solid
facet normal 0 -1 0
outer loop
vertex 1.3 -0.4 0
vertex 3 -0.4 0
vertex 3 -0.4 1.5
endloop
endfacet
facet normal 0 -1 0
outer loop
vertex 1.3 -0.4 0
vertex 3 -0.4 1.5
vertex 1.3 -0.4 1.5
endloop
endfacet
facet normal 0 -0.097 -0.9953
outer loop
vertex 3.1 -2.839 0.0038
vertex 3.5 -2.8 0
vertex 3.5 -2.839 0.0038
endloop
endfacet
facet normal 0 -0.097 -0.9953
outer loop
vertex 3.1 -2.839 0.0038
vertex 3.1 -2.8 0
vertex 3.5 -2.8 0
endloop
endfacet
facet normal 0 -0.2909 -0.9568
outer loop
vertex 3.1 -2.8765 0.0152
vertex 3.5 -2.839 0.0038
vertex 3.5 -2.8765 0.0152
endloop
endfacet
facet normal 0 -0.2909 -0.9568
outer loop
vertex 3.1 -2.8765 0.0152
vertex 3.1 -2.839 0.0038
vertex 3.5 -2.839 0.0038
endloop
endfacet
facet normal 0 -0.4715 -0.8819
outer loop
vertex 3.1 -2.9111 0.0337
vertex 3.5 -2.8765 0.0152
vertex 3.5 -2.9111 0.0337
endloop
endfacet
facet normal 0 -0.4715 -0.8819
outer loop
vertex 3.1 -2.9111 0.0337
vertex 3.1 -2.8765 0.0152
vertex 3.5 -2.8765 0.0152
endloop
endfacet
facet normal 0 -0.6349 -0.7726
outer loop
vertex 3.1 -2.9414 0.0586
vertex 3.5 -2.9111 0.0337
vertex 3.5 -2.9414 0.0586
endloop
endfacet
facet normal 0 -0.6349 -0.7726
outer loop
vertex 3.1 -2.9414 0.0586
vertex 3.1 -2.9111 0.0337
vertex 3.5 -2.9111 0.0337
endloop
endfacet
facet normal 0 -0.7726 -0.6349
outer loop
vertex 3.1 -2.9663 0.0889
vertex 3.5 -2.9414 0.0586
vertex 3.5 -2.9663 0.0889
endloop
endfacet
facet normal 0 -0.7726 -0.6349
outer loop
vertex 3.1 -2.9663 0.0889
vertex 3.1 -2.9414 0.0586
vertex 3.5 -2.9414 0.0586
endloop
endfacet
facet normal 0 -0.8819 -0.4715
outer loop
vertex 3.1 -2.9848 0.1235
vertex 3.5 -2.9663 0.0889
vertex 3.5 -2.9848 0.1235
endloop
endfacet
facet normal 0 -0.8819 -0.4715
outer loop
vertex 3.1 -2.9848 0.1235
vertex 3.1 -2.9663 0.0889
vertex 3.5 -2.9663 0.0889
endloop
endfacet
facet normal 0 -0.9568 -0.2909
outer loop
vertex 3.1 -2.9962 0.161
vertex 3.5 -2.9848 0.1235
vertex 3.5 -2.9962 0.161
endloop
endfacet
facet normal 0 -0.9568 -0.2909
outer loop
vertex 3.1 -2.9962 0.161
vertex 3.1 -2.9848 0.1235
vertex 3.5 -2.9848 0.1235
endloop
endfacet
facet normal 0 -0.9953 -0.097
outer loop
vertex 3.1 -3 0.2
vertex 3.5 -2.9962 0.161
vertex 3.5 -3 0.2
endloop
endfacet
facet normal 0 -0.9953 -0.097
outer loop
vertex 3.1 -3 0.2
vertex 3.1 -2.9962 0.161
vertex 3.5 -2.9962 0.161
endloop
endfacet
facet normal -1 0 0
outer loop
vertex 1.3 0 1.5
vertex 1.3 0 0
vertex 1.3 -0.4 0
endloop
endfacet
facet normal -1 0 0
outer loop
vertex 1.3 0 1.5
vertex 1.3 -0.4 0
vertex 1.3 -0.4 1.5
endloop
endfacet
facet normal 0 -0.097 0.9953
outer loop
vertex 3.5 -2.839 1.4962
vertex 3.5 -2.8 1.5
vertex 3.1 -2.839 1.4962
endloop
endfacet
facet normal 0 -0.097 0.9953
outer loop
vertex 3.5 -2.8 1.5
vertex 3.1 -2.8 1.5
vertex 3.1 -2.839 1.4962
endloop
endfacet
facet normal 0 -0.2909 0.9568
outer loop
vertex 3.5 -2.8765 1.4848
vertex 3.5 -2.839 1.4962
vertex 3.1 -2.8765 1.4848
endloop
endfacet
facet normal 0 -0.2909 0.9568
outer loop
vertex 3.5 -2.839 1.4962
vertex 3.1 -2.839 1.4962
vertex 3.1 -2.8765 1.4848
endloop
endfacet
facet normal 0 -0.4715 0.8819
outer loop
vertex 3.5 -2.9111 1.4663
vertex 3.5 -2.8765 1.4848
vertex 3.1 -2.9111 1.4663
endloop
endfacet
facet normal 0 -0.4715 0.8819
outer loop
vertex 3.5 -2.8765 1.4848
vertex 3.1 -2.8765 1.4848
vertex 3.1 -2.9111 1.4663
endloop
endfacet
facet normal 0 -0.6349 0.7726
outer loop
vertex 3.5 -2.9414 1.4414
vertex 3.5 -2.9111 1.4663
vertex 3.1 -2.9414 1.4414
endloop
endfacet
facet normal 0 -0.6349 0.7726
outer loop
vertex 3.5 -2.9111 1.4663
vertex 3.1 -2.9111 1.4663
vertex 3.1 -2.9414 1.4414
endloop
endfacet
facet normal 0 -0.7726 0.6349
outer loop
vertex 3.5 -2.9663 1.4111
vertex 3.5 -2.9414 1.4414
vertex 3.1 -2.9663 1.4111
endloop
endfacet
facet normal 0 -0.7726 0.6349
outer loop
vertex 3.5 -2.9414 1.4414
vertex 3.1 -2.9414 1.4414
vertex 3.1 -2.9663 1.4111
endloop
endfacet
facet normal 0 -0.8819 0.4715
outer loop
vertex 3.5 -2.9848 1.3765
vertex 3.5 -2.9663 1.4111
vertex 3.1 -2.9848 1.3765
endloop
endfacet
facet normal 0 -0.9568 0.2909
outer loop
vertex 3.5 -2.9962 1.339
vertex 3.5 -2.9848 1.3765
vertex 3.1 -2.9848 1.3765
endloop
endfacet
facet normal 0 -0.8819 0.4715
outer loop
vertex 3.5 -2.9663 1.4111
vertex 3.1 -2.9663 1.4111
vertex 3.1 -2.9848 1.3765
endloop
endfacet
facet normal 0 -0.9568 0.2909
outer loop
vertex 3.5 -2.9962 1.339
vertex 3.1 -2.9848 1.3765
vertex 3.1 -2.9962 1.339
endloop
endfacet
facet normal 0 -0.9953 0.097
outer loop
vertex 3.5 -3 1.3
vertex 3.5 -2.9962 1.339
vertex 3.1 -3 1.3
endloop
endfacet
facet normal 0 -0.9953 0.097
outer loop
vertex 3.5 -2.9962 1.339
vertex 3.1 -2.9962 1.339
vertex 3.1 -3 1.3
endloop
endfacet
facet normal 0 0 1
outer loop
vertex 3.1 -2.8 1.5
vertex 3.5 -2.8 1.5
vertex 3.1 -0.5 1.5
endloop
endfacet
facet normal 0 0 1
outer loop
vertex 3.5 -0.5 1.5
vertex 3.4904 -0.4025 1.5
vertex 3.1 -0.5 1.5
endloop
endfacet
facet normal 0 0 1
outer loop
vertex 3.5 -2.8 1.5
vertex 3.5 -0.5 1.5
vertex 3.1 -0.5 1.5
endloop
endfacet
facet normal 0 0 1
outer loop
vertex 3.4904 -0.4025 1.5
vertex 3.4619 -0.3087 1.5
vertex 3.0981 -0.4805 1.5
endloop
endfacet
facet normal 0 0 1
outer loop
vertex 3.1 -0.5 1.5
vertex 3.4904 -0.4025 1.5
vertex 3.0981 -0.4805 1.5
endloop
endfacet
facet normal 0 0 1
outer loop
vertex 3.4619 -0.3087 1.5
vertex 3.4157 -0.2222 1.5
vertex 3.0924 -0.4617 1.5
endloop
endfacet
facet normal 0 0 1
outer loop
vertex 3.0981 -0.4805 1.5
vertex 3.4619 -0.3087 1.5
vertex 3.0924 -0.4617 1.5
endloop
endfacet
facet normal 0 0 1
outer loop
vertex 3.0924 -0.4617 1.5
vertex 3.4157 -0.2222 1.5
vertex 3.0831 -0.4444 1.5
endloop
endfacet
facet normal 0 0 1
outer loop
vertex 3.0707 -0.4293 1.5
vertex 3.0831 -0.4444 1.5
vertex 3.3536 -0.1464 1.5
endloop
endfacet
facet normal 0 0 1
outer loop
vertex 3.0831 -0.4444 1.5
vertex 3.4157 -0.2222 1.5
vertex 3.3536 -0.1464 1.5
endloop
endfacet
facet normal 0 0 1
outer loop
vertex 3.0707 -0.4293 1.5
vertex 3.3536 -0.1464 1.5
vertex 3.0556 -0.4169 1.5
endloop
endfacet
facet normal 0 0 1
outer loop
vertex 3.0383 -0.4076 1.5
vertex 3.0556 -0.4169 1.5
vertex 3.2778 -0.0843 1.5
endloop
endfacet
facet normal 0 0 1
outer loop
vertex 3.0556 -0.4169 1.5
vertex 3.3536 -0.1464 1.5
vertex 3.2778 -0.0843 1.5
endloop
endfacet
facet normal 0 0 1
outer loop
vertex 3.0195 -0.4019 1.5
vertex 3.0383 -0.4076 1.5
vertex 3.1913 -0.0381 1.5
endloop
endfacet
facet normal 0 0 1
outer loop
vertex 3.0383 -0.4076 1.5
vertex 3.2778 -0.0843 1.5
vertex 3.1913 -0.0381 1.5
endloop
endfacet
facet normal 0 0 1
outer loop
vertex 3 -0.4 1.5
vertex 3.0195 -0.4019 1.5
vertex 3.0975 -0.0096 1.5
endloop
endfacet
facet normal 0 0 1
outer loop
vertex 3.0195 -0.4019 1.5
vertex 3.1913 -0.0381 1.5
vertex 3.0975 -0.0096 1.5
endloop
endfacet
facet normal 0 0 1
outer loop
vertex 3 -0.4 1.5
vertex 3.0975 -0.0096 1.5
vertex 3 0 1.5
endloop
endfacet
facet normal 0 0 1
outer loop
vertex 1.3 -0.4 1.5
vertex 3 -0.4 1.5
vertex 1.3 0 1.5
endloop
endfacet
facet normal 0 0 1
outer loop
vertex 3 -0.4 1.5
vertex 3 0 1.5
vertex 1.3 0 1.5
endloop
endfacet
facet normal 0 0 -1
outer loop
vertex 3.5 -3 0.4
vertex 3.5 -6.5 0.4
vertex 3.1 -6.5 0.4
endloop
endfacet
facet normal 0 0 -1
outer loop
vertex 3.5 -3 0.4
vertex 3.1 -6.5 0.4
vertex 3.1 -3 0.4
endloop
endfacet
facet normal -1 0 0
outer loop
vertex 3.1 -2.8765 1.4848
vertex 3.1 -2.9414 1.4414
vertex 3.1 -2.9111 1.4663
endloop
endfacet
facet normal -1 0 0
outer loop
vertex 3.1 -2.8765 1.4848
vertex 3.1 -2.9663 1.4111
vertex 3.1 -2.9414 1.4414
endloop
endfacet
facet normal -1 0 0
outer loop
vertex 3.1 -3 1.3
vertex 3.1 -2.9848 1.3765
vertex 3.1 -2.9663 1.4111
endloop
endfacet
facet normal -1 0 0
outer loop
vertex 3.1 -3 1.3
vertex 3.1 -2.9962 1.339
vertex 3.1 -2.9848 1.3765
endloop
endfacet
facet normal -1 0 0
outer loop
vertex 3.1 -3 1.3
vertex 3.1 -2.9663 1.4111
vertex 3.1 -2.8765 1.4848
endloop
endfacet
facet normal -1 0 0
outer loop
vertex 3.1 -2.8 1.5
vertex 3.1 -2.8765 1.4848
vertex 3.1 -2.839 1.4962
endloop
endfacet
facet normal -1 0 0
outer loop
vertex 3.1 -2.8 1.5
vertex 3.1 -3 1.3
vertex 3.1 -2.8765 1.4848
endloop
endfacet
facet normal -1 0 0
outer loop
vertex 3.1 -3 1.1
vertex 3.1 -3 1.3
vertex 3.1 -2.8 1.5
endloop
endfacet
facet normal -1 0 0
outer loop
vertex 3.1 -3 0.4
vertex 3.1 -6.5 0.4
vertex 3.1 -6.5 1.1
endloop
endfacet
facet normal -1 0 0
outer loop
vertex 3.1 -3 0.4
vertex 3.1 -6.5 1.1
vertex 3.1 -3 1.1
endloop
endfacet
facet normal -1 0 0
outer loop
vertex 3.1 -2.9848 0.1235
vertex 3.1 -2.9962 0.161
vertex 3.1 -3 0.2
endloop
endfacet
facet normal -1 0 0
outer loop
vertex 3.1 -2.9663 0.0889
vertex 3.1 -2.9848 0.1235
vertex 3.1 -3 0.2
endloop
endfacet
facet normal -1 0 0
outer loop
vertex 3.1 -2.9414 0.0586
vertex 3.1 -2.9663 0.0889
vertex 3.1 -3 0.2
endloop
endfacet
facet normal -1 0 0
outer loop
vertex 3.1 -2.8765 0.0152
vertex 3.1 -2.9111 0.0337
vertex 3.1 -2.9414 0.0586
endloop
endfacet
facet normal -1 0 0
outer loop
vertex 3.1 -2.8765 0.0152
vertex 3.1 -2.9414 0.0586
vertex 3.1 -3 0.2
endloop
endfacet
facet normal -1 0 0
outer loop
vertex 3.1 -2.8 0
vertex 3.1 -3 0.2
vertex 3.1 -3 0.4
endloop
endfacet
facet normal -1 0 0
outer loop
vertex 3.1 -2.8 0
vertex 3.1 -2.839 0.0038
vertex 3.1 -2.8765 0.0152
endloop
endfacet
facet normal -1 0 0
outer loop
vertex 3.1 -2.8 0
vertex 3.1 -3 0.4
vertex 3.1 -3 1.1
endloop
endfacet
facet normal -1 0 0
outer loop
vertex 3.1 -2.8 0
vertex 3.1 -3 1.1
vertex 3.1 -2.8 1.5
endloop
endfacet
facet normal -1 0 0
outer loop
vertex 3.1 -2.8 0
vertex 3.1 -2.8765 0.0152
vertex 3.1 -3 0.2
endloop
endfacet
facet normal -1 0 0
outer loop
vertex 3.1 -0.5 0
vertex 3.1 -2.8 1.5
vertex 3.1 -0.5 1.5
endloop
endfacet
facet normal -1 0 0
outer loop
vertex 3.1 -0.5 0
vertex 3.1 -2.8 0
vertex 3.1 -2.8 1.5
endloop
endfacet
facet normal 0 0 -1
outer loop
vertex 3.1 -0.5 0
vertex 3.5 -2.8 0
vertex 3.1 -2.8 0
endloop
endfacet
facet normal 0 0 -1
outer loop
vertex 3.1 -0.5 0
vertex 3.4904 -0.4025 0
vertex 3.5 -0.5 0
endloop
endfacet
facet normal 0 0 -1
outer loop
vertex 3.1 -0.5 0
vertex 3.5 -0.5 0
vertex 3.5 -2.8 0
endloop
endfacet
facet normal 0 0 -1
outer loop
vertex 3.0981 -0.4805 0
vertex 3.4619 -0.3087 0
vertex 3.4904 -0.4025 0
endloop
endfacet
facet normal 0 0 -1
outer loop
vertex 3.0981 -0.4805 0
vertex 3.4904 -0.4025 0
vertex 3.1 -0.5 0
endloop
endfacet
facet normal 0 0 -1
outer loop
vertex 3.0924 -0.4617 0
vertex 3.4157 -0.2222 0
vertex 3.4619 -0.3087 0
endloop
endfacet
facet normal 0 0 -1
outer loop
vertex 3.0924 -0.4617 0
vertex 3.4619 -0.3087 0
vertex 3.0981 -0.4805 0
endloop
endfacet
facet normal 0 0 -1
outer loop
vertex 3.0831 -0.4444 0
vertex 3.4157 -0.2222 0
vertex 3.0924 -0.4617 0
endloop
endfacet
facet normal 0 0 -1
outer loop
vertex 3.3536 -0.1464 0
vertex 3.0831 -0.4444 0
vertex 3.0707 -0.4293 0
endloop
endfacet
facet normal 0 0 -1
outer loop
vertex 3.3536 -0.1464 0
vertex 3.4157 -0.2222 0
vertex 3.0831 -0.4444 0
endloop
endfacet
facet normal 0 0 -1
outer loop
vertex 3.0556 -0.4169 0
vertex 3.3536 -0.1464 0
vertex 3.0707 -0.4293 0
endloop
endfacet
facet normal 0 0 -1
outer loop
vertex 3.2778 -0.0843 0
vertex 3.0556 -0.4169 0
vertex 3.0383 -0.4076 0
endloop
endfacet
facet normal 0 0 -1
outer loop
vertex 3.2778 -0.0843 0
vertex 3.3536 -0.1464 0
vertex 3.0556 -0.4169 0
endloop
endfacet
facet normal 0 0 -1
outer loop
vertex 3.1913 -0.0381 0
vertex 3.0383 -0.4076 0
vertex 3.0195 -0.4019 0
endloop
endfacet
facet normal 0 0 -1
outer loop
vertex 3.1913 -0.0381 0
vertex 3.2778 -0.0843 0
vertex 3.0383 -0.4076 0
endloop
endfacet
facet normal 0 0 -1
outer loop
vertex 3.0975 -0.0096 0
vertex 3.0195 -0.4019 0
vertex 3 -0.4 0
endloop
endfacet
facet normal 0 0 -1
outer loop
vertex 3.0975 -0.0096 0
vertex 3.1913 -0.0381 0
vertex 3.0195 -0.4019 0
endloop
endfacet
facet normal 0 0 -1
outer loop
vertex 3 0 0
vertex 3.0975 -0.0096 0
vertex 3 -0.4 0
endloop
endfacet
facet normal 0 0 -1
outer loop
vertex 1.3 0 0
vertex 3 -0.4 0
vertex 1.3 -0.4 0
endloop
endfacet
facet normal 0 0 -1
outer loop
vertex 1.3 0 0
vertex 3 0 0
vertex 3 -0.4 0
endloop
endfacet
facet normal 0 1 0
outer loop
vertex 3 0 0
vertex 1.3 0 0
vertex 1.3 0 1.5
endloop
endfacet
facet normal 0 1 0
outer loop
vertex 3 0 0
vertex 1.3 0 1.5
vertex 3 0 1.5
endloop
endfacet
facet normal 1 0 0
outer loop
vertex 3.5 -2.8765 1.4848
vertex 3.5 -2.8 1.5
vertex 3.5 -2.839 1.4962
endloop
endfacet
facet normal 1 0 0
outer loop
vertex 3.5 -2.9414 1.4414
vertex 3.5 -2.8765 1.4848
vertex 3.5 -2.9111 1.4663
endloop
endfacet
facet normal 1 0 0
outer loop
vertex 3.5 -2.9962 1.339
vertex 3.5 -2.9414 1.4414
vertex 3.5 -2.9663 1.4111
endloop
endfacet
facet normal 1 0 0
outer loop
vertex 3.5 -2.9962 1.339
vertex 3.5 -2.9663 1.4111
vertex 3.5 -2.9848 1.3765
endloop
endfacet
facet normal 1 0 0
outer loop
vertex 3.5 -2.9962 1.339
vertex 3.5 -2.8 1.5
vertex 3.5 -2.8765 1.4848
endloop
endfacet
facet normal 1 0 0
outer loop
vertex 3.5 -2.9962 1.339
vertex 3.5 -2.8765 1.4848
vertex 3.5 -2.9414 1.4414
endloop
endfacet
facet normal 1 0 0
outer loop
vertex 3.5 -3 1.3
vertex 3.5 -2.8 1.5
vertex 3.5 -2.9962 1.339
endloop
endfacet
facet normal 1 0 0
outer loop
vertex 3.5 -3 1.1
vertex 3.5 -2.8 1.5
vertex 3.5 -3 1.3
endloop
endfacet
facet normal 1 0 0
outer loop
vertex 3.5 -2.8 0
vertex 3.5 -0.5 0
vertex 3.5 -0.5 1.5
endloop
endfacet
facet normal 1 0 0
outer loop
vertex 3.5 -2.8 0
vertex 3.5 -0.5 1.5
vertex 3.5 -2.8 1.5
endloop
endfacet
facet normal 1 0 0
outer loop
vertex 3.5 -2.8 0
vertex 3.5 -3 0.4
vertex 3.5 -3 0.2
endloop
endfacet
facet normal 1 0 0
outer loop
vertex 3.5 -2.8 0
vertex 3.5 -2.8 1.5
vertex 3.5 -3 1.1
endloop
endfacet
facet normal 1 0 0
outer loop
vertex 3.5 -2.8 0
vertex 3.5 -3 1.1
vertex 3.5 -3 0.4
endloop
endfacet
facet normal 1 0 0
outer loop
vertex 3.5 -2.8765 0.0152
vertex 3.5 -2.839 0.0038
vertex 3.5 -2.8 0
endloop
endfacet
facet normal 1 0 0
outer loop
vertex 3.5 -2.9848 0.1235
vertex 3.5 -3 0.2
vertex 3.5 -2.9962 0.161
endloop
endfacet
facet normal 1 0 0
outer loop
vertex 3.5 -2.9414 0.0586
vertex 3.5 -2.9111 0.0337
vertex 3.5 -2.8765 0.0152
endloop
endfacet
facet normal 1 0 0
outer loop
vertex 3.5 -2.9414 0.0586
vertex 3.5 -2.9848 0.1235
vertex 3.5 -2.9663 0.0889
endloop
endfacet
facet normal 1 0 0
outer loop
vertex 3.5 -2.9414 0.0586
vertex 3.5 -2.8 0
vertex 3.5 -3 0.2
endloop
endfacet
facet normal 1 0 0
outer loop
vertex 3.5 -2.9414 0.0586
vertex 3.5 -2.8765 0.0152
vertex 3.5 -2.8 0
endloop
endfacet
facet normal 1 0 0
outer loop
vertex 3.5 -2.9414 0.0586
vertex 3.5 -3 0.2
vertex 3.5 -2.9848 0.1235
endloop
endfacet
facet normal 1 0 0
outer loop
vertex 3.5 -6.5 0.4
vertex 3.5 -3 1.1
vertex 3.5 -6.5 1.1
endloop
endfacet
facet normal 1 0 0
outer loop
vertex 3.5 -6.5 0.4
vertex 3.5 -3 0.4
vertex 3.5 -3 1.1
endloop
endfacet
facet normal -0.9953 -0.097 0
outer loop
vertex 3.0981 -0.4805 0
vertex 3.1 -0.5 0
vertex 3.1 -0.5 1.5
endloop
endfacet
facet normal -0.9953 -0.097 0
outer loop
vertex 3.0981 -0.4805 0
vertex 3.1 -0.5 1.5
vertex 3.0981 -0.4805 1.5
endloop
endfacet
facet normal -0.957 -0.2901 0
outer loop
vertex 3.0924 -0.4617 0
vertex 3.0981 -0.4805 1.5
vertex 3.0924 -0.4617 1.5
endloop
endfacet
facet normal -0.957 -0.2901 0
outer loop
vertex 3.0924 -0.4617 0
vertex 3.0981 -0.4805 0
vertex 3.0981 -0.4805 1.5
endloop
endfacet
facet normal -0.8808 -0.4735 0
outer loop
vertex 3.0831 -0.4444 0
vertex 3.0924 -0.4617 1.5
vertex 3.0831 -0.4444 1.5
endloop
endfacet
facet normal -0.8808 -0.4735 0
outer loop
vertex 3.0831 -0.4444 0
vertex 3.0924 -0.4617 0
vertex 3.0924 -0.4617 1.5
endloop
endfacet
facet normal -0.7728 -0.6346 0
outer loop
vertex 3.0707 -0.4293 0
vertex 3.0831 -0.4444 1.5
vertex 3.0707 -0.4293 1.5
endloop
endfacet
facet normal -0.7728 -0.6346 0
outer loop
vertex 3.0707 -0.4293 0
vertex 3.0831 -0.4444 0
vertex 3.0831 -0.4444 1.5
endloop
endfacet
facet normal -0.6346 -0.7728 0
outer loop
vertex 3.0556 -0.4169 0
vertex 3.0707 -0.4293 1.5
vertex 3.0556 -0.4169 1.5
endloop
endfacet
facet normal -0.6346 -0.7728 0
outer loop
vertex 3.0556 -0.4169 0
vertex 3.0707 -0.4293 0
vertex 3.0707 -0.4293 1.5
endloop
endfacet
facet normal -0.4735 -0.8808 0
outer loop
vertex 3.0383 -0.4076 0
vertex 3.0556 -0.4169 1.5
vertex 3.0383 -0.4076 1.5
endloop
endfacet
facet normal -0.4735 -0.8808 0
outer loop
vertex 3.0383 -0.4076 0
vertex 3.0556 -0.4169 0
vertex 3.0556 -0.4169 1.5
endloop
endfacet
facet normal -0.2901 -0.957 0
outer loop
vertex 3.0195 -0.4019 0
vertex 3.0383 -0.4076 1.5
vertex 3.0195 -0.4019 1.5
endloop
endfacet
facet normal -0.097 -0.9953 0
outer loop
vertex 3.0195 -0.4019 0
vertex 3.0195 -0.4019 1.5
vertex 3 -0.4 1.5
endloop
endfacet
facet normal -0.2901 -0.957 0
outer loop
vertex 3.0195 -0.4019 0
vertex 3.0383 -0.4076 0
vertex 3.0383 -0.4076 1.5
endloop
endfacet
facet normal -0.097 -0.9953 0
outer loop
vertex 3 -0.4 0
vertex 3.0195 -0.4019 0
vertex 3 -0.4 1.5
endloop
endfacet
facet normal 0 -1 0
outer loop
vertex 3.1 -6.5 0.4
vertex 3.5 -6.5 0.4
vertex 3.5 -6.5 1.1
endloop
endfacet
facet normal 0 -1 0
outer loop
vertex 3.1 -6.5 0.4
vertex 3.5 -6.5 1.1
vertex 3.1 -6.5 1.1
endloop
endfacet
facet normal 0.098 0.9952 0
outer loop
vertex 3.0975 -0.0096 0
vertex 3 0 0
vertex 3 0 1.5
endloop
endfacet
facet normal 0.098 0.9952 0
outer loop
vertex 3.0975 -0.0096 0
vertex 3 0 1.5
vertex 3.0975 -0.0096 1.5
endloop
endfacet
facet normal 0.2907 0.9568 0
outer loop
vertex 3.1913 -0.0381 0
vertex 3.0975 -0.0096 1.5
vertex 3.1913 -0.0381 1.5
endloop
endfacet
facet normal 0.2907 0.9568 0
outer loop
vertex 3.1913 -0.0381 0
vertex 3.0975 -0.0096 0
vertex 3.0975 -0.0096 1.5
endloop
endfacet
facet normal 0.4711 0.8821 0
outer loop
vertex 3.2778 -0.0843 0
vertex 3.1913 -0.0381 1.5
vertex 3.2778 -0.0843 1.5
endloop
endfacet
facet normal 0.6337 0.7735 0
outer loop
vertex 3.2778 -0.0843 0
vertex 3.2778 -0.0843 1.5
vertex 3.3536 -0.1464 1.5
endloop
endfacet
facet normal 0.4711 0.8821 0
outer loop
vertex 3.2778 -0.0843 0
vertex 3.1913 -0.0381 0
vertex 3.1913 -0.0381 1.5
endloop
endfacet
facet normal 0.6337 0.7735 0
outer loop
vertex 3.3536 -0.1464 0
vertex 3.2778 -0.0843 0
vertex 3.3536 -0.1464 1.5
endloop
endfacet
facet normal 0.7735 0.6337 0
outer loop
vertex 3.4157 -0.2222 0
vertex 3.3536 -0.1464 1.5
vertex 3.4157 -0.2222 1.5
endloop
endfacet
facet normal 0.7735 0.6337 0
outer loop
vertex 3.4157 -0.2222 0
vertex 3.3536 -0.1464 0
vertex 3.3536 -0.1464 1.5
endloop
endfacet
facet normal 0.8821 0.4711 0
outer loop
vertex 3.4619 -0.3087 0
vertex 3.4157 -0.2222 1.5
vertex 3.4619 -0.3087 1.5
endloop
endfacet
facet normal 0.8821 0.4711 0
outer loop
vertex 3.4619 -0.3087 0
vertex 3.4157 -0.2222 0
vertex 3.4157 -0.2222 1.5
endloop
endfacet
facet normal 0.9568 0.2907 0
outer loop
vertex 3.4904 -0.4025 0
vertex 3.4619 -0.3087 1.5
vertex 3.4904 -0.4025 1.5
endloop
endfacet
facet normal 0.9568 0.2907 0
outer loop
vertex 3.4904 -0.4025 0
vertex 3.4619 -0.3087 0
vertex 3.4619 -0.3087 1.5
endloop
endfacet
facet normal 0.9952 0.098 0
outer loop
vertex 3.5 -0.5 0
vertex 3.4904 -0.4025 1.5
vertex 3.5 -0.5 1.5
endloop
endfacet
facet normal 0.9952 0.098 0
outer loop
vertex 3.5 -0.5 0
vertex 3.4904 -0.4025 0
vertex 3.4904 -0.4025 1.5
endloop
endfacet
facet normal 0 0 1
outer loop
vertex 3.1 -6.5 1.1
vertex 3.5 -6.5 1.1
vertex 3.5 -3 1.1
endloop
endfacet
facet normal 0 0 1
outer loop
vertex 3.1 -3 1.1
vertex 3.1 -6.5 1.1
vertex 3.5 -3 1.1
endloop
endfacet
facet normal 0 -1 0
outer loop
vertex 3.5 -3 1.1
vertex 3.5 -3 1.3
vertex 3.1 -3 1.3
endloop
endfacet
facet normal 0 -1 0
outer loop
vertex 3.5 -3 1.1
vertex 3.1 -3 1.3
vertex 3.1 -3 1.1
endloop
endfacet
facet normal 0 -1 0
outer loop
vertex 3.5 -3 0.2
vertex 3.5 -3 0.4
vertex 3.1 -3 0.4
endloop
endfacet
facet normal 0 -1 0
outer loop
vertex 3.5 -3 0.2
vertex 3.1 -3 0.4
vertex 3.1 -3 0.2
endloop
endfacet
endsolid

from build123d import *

# Parameters (mm, degrees)
BOSS_EXTRUDE1_DEPTH = 1.5
SKETCH3_W           = 0.4
SKETCH3_H           = 3.5
CUT_EXTRUDE1_DEPTH  = 1.5
FILLET2_R           = 0.2
SKETCH4_W           = 1.5
SKETCH4_H           = 0.4
CUT_EXTRUDE2_DEPTH  = 1.3


with BuildPart() as part:
    # Sketch2 → Boss-Extrude1 (new body)
    with BuildSketch(Plane.XY):
        with BuildLine():
            Line((0, 0), (3, 0))
            ThreePointArc((3, 0), (3.353553391, -0.146446609), (3.5, -0.5))
            Line((3.5, -0.5), (3.5, -6.5))
            Line((3.5, -6.5), (3.1, -6.5))
            Line((3.1, -6.5), (3.1, -0.5))
            ThreePointArc((3.1, -0.5), (3.070710678, -0.429289322), (3, -0.4))
            Line((3, -0.4), (0, -0.4))
            Line((0, -0.4), (0, 0))
        make_face()
    extrude(amount=BOSS_EXTRUDE1_DEPTH)

    # Sketch3 → Cut-Extrude1 (cut)
    with BuildSketch(Plane(origin=(3.5, 0, 0), x_dir=(0, 0, -1), z_dir=(1, 0, 0))):
        with Locations((-0.2, -4.75)):
            Rectangle(SKETCH3_W, SKETCH3_H)
        with Locations((-1.3, -4.75)):
            Rectangle(SKETCH3_W, SKETCH3_H)
    extrude(amount=-CUT_EXTRUDE1_DEPTH, mode=Mode.SUBTRACT)

    # Fillet2
    fillet2_edges = [part.edges().sort_by_distance(p)[0] for p in [
        (3.3, -3, 1.5),
        (3.3, -3, 0),
    ]]
    fillet(fillet2_edges, radius=FILLET2_R)

    # Sketch4 → Cut-Extrude2 (cut)
    with BuildSketch(Plane.ZY):
        with Locations((0.75, -0.2)):
            Rectangle(SKETCH4_W, SKETCH4_H)
    extrude(amount=-CUT_EXTRUDE2_DEPTH, mode=Mode.SUBTRACT)


solid = part.part
